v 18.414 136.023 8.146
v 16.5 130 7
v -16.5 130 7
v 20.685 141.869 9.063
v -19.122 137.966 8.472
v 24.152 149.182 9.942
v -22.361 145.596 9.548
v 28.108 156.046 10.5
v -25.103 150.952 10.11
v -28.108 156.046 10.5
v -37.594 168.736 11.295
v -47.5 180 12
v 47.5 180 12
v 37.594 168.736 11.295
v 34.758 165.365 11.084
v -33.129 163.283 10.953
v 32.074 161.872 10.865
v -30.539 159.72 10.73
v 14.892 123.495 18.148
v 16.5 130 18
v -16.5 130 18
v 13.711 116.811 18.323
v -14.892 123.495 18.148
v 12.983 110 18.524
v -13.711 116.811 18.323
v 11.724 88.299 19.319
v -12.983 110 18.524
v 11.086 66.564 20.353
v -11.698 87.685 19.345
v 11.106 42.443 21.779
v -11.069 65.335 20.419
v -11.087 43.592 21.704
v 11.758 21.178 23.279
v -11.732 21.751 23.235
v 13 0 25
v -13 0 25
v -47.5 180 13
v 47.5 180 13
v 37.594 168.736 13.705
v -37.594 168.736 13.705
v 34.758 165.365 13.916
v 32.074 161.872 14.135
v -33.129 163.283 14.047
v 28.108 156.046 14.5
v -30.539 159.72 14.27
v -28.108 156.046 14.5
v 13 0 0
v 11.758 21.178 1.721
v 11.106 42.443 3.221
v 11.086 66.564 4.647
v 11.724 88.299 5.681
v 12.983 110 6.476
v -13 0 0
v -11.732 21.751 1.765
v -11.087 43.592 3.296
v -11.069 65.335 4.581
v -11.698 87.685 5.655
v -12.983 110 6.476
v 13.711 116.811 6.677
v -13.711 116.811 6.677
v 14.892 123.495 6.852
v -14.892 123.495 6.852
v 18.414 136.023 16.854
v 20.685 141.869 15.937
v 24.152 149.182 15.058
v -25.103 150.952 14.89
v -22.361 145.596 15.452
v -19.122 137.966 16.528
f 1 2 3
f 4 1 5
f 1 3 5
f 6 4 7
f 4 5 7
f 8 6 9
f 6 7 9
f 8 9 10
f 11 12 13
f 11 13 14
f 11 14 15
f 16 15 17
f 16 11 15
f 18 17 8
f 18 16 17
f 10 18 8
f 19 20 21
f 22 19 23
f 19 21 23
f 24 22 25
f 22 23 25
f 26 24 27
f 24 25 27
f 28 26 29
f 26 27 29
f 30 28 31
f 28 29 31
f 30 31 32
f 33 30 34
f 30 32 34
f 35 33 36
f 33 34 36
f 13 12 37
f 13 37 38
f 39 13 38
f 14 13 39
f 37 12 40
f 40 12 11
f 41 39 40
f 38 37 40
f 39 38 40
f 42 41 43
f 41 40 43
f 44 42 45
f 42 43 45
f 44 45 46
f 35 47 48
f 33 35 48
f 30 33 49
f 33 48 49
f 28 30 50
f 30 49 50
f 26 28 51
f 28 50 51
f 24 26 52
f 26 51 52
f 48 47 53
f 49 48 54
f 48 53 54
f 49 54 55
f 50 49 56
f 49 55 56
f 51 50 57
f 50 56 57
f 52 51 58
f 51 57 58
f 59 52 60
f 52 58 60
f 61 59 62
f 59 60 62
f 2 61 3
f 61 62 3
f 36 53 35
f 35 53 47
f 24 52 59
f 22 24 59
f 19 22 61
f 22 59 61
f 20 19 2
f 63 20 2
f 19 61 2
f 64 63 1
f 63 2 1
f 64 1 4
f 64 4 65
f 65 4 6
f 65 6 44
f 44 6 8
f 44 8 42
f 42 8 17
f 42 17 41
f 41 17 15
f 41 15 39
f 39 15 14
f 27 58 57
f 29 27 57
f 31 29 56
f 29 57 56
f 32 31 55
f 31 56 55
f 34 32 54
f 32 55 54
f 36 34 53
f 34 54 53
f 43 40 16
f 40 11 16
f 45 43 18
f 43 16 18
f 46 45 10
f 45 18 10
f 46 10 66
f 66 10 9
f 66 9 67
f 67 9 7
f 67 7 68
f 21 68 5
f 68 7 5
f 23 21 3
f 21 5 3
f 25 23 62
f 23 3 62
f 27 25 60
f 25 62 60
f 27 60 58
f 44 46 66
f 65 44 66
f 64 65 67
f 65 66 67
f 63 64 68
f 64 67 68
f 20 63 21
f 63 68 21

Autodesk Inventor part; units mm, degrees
ref_plane "YZ Plane" through (0, 0, 0) normal (1, 0, 0) x (0, 1, 0)
ref_plane "XZ Plane" through (0, 0, 0) normal (0, 1, 0) x (-1, 0, 0)
ref_plane "XY Plane" through (0, 0, 0) normal (0, 0, 1) x (1, 0, 0)
sketch "Эскиз1" plane through (0, 0, 0) normal (0, 0, 1) x (1, 0, 0)
  line L0 (-13, 0) -> (13, 0)
  line L1 (-47.5, 180) -> (47.5, 180)
  line L2 (-16.5, 130) -> (16.5, 130)
  line L3 (-12.9827, 110) -> (12.9827, 110)
  line L4 (-11.8003, 90) -> (11.8003, 90)
  line L5 (47.5, 180) -> (37.594, 168.7363)
  line L6 (-47.5, 180) -> (-37.594, 168.7363)
  line L7 (-37.594, 168.7363) -> (37.594, 168.7363)
  arc A0 (37.594, 168.7363) -> (12.9827, 110) centre (112.573, 102.7948) ccw
  arc A1 (12.9827, 110) -> (13, 0) centre (771.5375, 55.1194) ccw
  arc A2 (-12.9827, 110) -> (-37.594, 168.7363) centre (-112.573, 102.7948) ccw
  arc A3 (-13, 0) -> (-12.9827, 110) centre (-771.5375, 55.1194) ccw
  line L8 (-11, 80.4723) -> (-11, 26.1046)
  line L9 (11, 80.4723) -> (11, 26.1046)
  line L10 (-37.594, 168.7363) -> (13.0707, 111.1279)
  line L11 (37.594, 168.7363) -> (-13.0707, 111.1279)
  point P0 (0, 0)
  point P1 (0, 0)
  point P2 (0, 180)
  point P3 (0, 130)
  point P4 (0, 90)
  point P5 (0, 110)
  point P6 (-11, 55.1194)
  dimension "d0" = 26
  dimension "d1" = 95
  dimension "d2" = 33
  dimension "d5" = 180
  dimension "d6" = 50
  dimension "d7" = 20
  dimension "d8" = 20
  dimension "d9" = 15
  dimension "d10" = 15
  dimension "d13" = 22
  dimension "d19" = 55.1194
extrude "Выдавливание1" add sketch "Эскиз1" along normal blind 25
sketch "Эскиз2" plane through (0, 0, 0) normal (1, 0, 0) x (0, 1, 0)
  line L0 (0, 0) -> (110, 0) projected
  line L1 (110, 0) -> (110, 25) projected
  line L2 (0, 25) -> (110, 25) projected
  line L3 (0, 0) -> (0, 25) projected
  line L4 (110, 0) -> (169.3956, 0) projected
  line L5 (110, 25) -> (169.3956, 25) projected
  line L6 (110, 0) -> (110, 25) projected
  line L7 (130, 18) -> (130, 7)
  line L8 (55, 21) -> (55, 4)
  arc A0 (0, 25) -> (130, 18) centre (172.2556, 2013.3889) ccw
  arc A1 (130, 7) -> (0, 0) centre (172.2556, -1988.3889) ccw
  line L9 (180, 13) -> (180, 12)
  line L10 (156.0464, 14.5) -> (156.0464, 10.5)
  line L11 (180, 13) -> (156.0464, 14.5)
  line L12 (180, 12) -> (156.0464, 10.5)
  arc A2 (130, 18) -> (156.0464, 14.5) centre (167.6171, 199.2737) ccw
  arc A3 (156.0464, 10.5) -> (130, 7) centre (167.6171, -174.2737) ccw
  line L13 (168.7363, 0) -> (180, 0) projected
  line L14 (180, 0) -> (180, 25) projected
  line L15 (168.7363, 25) -> (180, 25) projected
  point P0 (130, 12.5)
  point P1 (0, 12.5)
  point P2 (55, 12.5)
  point P3 (180, 12.5)
  point P4 (169.3956, 12.5)
  point P5 (156.0464, 12.5)
  point P6 (180, 12.5)
  dimension "d16" = 11
  dimension "d20" = 55
  dimension "d21" = 17
  dimension "d22" = 1
  dimension "d23" = 4
  dimension "d28" = 50
  dimension "d30" = 23.9536
extrude "Выдавливание2" cut sketch "Эскиз2" along normal mid plane 100 contours L3 A0 L8 A1 | L8 A0 L1 A1 | L1 A0 L7 A1 | L7 A2 L10 A3 | L10 L11 L9 L12 keep common part
sketch "Эскиз3" plane through (0, 0, 0) normal (0, 0, 1) x (1, 0, 0)
  arc A0 (37.594, 168.7363) -> (28.1076, 156.0464) centre (112.573, 102.7948) ccw projected
  line L0 (37.594, 168.7363) -> (47.5, 180) projected
  line L1 (47.5, 180) -> (-47.5, 180) projected
  line L2 (-47.5, 180) -> (-37.594, 168.7363) projected
  arc A1 (-28.1076, 156.0464) -> (-37.594, 168.7363) centre (-112.573, 102.7948) ccw projected
  line L3 (-28.1076, 156.0464) -> (28.1076, 156.0464) projected
  line L4 (-28.1076, 156.0464) -> (28.1076, 156.0464) projected
  line L5 (16.5, 130) -> (-16.5, 130) projected
  line L6 (16.5, 130) -> (-16.5, 130) projected
  line L7 (-13, 0) -> (13, 0) projected
  point P0 (0, 0)
  point P1 (12.9827, 110)
  point P2 (-12.9827, 110)
  point P3 (-30, 158.9361)
  point P4 (30, 158.9361)
  dimension "d31" = 60
  dimension "d32" = 2.8897
properties part number "bachi_v2"
